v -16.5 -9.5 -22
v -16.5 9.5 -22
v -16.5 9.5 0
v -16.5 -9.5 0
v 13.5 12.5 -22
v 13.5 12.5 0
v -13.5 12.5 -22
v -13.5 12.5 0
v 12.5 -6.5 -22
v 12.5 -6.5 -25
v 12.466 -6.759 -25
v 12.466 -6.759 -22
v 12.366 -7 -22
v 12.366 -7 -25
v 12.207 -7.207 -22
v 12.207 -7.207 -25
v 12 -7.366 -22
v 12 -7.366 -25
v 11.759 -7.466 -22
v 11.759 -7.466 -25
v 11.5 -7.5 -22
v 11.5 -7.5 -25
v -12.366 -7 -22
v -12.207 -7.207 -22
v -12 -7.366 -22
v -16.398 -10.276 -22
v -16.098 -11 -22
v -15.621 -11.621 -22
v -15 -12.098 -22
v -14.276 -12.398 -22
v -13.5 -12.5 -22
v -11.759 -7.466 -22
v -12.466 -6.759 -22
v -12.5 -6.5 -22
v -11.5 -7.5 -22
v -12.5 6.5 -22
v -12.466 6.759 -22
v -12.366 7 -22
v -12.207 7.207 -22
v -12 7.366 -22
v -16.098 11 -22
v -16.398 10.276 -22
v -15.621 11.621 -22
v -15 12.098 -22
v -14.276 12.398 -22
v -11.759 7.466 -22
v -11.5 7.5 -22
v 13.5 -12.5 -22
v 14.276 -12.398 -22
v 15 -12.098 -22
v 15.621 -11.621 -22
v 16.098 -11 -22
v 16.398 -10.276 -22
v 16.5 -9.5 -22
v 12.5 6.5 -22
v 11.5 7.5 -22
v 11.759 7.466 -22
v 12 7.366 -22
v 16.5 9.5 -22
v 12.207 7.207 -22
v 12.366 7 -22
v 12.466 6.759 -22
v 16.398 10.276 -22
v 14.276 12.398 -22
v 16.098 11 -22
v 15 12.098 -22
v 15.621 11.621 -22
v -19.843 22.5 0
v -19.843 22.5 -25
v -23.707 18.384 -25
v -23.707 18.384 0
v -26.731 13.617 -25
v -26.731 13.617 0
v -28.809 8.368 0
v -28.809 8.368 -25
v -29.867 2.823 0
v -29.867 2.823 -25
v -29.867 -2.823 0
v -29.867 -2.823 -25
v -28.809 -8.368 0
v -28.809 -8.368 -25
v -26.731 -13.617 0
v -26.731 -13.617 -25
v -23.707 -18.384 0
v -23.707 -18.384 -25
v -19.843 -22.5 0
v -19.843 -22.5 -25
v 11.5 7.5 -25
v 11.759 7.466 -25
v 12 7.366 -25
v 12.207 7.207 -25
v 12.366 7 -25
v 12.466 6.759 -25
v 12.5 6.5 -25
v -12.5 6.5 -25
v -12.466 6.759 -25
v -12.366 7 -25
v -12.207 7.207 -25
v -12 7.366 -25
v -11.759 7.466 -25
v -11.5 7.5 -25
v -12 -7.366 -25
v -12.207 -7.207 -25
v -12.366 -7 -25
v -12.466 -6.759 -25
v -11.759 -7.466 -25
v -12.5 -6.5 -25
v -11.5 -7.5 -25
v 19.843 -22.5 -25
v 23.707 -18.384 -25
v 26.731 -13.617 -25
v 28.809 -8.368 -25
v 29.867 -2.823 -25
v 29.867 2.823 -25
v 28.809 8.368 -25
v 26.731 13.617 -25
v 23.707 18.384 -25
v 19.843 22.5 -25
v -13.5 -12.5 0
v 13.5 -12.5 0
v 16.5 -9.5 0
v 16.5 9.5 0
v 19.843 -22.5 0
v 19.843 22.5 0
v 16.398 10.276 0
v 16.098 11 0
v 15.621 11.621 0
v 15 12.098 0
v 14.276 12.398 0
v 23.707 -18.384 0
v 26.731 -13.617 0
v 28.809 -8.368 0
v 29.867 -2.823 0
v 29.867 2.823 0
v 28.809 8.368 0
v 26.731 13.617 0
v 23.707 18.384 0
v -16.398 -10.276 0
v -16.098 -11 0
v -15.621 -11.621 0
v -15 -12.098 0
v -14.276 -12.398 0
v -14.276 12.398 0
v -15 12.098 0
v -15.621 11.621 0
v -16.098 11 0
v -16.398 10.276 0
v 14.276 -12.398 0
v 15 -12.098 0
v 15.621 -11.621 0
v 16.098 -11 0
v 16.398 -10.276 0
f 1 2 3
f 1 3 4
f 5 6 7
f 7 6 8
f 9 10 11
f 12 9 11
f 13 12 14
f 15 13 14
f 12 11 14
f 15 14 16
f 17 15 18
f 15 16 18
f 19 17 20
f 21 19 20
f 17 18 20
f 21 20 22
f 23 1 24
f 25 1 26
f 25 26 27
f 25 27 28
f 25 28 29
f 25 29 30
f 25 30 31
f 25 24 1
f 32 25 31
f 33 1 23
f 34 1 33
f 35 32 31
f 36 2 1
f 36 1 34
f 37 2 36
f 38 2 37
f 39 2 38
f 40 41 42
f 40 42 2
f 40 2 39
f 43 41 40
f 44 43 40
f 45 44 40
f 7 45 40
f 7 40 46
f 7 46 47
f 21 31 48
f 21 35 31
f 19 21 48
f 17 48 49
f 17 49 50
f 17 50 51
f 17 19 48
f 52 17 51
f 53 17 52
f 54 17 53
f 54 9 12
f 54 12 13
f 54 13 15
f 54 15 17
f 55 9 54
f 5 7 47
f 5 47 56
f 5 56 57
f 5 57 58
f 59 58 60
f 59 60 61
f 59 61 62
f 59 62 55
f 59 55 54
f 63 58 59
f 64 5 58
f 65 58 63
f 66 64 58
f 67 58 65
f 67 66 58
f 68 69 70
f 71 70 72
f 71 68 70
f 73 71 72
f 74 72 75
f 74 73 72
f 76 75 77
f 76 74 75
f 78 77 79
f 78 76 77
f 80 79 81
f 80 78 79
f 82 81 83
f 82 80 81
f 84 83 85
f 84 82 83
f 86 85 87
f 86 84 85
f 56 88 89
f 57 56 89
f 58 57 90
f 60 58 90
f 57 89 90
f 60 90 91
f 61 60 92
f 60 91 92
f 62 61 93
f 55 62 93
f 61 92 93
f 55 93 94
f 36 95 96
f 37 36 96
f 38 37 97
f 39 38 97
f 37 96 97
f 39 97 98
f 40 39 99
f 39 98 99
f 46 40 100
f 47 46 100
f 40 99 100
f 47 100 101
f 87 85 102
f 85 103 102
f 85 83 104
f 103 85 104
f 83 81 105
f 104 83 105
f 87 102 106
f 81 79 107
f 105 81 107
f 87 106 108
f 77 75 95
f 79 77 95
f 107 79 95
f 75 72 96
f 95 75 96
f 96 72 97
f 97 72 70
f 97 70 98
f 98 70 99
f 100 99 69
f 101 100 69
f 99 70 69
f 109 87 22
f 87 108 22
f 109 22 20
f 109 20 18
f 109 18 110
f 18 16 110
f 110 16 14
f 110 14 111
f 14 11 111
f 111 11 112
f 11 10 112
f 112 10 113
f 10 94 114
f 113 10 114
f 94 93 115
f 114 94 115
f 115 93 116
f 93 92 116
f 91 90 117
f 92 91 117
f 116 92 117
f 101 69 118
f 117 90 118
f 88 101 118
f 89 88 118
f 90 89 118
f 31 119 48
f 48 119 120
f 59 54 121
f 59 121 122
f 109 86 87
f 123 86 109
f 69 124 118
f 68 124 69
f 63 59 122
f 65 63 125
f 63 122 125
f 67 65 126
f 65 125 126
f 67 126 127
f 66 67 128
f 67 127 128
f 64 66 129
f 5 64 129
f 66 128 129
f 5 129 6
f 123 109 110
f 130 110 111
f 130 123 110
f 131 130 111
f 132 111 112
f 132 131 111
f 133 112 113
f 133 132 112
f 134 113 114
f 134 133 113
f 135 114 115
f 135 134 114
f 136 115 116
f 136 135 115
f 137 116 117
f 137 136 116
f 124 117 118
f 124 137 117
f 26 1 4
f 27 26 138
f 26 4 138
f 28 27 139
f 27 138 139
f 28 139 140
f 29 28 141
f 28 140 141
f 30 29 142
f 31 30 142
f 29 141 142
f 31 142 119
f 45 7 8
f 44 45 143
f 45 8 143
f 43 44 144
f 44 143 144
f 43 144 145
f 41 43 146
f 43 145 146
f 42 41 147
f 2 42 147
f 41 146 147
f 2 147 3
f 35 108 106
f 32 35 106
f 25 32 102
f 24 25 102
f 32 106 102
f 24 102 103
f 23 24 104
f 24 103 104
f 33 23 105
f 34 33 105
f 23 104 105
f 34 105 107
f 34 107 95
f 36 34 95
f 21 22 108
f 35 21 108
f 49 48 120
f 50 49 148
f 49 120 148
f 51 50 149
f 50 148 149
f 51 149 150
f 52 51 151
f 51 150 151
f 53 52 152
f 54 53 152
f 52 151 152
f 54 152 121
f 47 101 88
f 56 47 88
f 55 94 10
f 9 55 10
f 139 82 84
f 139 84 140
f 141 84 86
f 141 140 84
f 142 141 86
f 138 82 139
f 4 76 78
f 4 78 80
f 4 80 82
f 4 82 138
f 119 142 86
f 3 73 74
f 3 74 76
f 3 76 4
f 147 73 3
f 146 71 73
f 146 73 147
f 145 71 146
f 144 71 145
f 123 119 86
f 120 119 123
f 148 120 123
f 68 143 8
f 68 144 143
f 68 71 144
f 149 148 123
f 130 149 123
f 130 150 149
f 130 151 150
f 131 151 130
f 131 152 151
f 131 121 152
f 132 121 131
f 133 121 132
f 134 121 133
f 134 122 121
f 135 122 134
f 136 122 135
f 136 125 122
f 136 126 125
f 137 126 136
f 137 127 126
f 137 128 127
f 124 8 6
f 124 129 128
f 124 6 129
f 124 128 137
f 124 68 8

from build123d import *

# Parameters (mm, degrees)
F2_DEPTH = 25
F3_DEPTH = 22
F5_DEPTH = 3


with BuildPart() as f2:
    # F0 (on Top) → F2 (new body)
    with BuildSketch(Plane.XY):
        with BuildLine():
            Line((19.843135, 22.5), (-19.843135, 22.5))
            ThreePointArc((-19.843135, 22.5), (-30, 0), (-19.843135, -22.5))
            Line((-19.843135, -22.5), (19.843135, -22.5))
            ThreePointArc((19.843135, -22.5), (30, 0), (19.843135, 22.5))
        make_face()
    extrude(amount=-F2_DEPTH)

    # F1 (on face) → F3 (cut)
    with BuildSketch(Plane.XY):
        with BuildLine():
            ThreePointArc((-16.5, -9.5), (-15.62132, -11.62132), (-13.5, -12.5))
            Line((-13.5, -12.5), (13.5, -12.5))
            ThreePointArc((13.5, -12.5), (15.62132, -11.62132), (16.5, -9.5))
            Line((16.5, -9.5), (16.5, 9.5))
            ThreePointArc((16.5, 9.5), (15.62132, 11.62132), (13.5, 12.5))
            Line((13.5, 12.5), (-13.5, 12.5))
            ThreePointArc((-13.5, 12.5), (-15.62132, 11.62132), (-16.5, 9.5))
            Line((-16.5, 9.5), (-16.5, -9.5))
        make_face()
    extrude(amount=-F3_DEPTH, mode=Mode.SUBTRACT)

    # F4 (on face) → F5 (cut, through all)
    with BuildSketch(Plane(origin=(0, 0, -25), x_dir=(1, 0, 0), z_dir=(0, 0, -1))):
        with BuildLine():
            ThreePointArc((-12.5, -6.5), (-12.207107, -7.207107), (-11.5, -7.5))
            Line((-11.5, -7.5), (11.5, -7.5))
            ThreePointArc((11.5, -7.5), (12.207107, -7.207107), (12.5, -6.5))
            Line((12.5, -6.5), (12.5, 6.5))
            ThreePointArc((12.5, 6.5), (12.207107, 7.207107), (11.5, 7.5))
            Line((11.5, 7.5), (-11.5, 7.5))
            ThreePointArc((-11.5, 7.5), (-12.207107, 7.207107), (-12.5, 6.5))
            Line((-12.5, 6.5), (-12.5, -6.5))
        make_face()
    extrude(amount=-F5_DEPTH, mode=Mode.SUBTRACT)


solid = f2.part
